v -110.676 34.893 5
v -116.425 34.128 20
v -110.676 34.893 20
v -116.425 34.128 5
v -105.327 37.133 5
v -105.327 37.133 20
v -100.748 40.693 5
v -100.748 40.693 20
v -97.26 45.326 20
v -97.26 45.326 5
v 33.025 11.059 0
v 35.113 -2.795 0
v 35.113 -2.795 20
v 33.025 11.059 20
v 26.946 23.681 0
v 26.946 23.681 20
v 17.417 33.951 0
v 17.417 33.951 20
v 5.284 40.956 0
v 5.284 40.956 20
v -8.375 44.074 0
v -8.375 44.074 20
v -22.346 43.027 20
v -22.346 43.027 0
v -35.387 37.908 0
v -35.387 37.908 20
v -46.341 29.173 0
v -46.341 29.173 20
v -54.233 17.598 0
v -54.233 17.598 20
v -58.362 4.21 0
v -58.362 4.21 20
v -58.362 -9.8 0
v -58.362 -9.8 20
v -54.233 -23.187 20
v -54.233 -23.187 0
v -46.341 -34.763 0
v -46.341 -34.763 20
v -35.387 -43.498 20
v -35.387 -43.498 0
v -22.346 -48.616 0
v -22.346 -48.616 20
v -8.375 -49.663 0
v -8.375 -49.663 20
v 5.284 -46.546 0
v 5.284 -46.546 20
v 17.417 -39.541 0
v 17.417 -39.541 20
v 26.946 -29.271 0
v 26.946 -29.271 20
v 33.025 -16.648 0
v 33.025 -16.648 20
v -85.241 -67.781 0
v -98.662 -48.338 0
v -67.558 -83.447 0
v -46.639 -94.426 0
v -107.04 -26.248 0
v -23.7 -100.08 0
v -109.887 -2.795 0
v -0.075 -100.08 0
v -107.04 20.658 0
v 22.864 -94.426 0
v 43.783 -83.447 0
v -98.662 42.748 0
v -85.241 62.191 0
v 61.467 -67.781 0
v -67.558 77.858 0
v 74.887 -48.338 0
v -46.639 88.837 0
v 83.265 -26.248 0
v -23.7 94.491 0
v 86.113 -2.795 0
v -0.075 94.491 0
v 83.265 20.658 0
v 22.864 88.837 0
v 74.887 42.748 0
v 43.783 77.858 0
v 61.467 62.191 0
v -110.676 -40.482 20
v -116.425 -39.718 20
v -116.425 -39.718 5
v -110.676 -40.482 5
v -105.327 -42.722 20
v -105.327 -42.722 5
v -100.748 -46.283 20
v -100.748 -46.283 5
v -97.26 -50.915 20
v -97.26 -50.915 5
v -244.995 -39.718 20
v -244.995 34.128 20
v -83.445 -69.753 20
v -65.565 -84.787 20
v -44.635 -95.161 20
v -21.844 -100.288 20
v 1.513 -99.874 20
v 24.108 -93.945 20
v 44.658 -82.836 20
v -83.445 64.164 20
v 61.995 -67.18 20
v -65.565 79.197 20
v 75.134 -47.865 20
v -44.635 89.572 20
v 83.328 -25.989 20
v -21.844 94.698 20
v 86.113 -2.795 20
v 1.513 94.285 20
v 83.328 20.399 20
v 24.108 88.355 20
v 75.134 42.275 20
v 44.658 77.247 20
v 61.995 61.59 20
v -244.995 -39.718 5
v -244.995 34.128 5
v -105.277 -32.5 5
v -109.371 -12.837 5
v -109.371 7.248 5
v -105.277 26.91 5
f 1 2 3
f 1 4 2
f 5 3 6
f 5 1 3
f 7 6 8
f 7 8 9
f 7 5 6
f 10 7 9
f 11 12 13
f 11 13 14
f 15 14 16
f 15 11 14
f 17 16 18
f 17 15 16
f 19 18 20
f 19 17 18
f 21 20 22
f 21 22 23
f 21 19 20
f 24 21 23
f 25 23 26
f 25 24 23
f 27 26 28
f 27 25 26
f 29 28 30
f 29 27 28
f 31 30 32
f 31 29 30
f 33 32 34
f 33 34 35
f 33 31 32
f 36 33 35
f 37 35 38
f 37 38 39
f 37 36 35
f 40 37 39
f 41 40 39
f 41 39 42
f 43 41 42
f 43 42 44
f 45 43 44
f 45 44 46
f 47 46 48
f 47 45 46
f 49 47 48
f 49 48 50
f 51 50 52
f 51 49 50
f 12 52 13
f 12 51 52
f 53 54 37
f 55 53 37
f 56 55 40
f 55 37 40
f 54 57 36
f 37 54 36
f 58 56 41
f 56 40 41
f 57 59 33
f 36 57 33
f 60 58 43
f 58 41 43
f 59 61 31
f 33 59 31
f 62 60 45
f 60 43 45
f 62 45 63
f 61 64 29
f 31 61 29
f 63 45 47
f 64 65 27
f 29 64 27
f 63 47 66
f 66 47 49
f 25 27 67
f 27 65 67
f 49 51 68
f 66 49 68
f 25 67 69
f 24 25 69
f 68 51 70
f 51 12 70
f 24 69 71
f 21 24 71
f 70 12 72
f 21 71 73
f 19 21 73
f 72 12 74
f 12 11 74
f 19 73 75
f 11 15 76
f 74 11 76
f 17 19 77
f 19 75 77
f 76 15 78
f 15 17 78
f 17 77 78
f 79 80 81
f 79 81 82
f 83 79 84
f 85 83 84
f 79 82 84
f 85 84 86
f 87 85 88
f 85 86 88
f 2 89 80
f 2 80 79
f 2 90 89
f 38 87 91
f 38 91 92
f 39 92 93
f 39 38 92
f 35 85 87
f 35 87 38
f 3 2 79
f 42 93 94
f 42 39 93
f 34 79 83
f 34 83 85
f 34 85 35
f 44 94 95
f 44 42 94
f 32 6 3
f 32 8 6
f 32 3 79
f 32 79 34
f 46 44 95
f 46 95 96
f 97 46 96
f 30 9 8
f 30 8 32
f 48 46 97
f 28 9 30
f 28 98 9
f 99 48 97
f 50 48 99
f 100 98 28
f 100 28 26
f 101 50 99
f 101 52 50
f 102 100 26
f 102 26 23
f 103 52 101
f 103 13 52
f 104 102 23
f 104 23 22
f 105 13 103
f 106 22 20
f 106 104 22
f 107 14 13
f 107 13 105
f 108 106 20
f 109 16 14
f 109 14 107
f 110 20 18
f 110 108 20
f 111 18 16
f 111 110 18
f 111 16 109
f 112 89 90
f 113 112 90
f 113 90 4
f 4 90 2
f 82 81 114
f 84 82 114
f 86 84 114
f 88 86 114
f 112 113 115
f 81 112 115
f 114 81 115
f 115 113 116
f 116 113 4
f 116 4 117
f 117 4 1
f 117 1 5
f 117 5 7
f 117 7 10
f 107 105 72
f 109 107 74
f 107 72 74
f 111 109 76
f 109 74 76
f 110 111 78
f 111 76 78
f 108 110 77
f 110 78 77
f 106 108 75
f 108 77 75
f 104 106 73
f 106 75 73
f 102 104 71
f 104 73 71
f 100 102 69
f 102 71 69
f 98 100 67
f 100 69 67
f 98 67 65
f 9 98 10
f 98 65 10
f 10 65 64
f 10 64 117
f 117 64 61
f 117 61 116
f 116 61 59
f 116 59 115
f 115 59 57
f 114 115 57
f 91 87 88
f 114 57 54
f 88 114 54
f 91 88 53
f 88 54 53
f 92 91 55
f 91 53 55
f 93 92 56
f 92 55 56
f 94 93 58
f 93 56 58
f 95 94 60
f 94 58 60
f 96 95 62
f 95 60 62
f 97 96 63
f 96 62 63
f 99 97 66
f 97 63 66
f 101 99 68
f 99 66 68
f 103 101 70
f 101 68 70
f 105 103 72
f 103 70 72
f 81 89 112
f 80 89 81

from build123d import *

# Parameters (mm, degrees)
SKETCH_1_R      = 98
SKETCH_1_R_2    = 47
EXTRUDE_1_DEPTH = 20
SKETCH_2_W      = 142.329371157
SKETCH_2_H      = 73.846071027
EXTRUDE_2_DEPTH = 15
FILLET_1_R      = 22


with BuildPart() as part:
    # 草图1 → 凸台-拉伸1 (new body)
    with BuildSketch(Plane.XY):
        with Locations((-11.887359686, -2.794806673)):
            Circle(SKETCH_1_R)
        with Locations((-11.887359686, -2.794806673)):
            Circle(SKETCH_1_R_2, mode=Mode.SUBTRACT)
    extrude(amount=EXTRUDE_1_DEPTH)

    # 草图2 → 凸台-拉伸2 (add)
    with BuildSketch(Plane.XY.offset(20)):
        with Locations((-173.83028852, -2.794806673)):
            Rectangle(SKETCH_2_W, SKETCH_2_H)
    extrude(amount=-EXTRUDE_2_DEPTH)

    # 圆角1
    fillet_1_edges = [part.edges().sort_by_distance(p)[0] for p in [
        (-102.665602941, 34.128228841, 12.5),
        (-102.665602941, -39.717842186, 12.5),
    ]]
    fillet(fillet_1_edges, radius=FILLET_1_R)


solid = part.part
